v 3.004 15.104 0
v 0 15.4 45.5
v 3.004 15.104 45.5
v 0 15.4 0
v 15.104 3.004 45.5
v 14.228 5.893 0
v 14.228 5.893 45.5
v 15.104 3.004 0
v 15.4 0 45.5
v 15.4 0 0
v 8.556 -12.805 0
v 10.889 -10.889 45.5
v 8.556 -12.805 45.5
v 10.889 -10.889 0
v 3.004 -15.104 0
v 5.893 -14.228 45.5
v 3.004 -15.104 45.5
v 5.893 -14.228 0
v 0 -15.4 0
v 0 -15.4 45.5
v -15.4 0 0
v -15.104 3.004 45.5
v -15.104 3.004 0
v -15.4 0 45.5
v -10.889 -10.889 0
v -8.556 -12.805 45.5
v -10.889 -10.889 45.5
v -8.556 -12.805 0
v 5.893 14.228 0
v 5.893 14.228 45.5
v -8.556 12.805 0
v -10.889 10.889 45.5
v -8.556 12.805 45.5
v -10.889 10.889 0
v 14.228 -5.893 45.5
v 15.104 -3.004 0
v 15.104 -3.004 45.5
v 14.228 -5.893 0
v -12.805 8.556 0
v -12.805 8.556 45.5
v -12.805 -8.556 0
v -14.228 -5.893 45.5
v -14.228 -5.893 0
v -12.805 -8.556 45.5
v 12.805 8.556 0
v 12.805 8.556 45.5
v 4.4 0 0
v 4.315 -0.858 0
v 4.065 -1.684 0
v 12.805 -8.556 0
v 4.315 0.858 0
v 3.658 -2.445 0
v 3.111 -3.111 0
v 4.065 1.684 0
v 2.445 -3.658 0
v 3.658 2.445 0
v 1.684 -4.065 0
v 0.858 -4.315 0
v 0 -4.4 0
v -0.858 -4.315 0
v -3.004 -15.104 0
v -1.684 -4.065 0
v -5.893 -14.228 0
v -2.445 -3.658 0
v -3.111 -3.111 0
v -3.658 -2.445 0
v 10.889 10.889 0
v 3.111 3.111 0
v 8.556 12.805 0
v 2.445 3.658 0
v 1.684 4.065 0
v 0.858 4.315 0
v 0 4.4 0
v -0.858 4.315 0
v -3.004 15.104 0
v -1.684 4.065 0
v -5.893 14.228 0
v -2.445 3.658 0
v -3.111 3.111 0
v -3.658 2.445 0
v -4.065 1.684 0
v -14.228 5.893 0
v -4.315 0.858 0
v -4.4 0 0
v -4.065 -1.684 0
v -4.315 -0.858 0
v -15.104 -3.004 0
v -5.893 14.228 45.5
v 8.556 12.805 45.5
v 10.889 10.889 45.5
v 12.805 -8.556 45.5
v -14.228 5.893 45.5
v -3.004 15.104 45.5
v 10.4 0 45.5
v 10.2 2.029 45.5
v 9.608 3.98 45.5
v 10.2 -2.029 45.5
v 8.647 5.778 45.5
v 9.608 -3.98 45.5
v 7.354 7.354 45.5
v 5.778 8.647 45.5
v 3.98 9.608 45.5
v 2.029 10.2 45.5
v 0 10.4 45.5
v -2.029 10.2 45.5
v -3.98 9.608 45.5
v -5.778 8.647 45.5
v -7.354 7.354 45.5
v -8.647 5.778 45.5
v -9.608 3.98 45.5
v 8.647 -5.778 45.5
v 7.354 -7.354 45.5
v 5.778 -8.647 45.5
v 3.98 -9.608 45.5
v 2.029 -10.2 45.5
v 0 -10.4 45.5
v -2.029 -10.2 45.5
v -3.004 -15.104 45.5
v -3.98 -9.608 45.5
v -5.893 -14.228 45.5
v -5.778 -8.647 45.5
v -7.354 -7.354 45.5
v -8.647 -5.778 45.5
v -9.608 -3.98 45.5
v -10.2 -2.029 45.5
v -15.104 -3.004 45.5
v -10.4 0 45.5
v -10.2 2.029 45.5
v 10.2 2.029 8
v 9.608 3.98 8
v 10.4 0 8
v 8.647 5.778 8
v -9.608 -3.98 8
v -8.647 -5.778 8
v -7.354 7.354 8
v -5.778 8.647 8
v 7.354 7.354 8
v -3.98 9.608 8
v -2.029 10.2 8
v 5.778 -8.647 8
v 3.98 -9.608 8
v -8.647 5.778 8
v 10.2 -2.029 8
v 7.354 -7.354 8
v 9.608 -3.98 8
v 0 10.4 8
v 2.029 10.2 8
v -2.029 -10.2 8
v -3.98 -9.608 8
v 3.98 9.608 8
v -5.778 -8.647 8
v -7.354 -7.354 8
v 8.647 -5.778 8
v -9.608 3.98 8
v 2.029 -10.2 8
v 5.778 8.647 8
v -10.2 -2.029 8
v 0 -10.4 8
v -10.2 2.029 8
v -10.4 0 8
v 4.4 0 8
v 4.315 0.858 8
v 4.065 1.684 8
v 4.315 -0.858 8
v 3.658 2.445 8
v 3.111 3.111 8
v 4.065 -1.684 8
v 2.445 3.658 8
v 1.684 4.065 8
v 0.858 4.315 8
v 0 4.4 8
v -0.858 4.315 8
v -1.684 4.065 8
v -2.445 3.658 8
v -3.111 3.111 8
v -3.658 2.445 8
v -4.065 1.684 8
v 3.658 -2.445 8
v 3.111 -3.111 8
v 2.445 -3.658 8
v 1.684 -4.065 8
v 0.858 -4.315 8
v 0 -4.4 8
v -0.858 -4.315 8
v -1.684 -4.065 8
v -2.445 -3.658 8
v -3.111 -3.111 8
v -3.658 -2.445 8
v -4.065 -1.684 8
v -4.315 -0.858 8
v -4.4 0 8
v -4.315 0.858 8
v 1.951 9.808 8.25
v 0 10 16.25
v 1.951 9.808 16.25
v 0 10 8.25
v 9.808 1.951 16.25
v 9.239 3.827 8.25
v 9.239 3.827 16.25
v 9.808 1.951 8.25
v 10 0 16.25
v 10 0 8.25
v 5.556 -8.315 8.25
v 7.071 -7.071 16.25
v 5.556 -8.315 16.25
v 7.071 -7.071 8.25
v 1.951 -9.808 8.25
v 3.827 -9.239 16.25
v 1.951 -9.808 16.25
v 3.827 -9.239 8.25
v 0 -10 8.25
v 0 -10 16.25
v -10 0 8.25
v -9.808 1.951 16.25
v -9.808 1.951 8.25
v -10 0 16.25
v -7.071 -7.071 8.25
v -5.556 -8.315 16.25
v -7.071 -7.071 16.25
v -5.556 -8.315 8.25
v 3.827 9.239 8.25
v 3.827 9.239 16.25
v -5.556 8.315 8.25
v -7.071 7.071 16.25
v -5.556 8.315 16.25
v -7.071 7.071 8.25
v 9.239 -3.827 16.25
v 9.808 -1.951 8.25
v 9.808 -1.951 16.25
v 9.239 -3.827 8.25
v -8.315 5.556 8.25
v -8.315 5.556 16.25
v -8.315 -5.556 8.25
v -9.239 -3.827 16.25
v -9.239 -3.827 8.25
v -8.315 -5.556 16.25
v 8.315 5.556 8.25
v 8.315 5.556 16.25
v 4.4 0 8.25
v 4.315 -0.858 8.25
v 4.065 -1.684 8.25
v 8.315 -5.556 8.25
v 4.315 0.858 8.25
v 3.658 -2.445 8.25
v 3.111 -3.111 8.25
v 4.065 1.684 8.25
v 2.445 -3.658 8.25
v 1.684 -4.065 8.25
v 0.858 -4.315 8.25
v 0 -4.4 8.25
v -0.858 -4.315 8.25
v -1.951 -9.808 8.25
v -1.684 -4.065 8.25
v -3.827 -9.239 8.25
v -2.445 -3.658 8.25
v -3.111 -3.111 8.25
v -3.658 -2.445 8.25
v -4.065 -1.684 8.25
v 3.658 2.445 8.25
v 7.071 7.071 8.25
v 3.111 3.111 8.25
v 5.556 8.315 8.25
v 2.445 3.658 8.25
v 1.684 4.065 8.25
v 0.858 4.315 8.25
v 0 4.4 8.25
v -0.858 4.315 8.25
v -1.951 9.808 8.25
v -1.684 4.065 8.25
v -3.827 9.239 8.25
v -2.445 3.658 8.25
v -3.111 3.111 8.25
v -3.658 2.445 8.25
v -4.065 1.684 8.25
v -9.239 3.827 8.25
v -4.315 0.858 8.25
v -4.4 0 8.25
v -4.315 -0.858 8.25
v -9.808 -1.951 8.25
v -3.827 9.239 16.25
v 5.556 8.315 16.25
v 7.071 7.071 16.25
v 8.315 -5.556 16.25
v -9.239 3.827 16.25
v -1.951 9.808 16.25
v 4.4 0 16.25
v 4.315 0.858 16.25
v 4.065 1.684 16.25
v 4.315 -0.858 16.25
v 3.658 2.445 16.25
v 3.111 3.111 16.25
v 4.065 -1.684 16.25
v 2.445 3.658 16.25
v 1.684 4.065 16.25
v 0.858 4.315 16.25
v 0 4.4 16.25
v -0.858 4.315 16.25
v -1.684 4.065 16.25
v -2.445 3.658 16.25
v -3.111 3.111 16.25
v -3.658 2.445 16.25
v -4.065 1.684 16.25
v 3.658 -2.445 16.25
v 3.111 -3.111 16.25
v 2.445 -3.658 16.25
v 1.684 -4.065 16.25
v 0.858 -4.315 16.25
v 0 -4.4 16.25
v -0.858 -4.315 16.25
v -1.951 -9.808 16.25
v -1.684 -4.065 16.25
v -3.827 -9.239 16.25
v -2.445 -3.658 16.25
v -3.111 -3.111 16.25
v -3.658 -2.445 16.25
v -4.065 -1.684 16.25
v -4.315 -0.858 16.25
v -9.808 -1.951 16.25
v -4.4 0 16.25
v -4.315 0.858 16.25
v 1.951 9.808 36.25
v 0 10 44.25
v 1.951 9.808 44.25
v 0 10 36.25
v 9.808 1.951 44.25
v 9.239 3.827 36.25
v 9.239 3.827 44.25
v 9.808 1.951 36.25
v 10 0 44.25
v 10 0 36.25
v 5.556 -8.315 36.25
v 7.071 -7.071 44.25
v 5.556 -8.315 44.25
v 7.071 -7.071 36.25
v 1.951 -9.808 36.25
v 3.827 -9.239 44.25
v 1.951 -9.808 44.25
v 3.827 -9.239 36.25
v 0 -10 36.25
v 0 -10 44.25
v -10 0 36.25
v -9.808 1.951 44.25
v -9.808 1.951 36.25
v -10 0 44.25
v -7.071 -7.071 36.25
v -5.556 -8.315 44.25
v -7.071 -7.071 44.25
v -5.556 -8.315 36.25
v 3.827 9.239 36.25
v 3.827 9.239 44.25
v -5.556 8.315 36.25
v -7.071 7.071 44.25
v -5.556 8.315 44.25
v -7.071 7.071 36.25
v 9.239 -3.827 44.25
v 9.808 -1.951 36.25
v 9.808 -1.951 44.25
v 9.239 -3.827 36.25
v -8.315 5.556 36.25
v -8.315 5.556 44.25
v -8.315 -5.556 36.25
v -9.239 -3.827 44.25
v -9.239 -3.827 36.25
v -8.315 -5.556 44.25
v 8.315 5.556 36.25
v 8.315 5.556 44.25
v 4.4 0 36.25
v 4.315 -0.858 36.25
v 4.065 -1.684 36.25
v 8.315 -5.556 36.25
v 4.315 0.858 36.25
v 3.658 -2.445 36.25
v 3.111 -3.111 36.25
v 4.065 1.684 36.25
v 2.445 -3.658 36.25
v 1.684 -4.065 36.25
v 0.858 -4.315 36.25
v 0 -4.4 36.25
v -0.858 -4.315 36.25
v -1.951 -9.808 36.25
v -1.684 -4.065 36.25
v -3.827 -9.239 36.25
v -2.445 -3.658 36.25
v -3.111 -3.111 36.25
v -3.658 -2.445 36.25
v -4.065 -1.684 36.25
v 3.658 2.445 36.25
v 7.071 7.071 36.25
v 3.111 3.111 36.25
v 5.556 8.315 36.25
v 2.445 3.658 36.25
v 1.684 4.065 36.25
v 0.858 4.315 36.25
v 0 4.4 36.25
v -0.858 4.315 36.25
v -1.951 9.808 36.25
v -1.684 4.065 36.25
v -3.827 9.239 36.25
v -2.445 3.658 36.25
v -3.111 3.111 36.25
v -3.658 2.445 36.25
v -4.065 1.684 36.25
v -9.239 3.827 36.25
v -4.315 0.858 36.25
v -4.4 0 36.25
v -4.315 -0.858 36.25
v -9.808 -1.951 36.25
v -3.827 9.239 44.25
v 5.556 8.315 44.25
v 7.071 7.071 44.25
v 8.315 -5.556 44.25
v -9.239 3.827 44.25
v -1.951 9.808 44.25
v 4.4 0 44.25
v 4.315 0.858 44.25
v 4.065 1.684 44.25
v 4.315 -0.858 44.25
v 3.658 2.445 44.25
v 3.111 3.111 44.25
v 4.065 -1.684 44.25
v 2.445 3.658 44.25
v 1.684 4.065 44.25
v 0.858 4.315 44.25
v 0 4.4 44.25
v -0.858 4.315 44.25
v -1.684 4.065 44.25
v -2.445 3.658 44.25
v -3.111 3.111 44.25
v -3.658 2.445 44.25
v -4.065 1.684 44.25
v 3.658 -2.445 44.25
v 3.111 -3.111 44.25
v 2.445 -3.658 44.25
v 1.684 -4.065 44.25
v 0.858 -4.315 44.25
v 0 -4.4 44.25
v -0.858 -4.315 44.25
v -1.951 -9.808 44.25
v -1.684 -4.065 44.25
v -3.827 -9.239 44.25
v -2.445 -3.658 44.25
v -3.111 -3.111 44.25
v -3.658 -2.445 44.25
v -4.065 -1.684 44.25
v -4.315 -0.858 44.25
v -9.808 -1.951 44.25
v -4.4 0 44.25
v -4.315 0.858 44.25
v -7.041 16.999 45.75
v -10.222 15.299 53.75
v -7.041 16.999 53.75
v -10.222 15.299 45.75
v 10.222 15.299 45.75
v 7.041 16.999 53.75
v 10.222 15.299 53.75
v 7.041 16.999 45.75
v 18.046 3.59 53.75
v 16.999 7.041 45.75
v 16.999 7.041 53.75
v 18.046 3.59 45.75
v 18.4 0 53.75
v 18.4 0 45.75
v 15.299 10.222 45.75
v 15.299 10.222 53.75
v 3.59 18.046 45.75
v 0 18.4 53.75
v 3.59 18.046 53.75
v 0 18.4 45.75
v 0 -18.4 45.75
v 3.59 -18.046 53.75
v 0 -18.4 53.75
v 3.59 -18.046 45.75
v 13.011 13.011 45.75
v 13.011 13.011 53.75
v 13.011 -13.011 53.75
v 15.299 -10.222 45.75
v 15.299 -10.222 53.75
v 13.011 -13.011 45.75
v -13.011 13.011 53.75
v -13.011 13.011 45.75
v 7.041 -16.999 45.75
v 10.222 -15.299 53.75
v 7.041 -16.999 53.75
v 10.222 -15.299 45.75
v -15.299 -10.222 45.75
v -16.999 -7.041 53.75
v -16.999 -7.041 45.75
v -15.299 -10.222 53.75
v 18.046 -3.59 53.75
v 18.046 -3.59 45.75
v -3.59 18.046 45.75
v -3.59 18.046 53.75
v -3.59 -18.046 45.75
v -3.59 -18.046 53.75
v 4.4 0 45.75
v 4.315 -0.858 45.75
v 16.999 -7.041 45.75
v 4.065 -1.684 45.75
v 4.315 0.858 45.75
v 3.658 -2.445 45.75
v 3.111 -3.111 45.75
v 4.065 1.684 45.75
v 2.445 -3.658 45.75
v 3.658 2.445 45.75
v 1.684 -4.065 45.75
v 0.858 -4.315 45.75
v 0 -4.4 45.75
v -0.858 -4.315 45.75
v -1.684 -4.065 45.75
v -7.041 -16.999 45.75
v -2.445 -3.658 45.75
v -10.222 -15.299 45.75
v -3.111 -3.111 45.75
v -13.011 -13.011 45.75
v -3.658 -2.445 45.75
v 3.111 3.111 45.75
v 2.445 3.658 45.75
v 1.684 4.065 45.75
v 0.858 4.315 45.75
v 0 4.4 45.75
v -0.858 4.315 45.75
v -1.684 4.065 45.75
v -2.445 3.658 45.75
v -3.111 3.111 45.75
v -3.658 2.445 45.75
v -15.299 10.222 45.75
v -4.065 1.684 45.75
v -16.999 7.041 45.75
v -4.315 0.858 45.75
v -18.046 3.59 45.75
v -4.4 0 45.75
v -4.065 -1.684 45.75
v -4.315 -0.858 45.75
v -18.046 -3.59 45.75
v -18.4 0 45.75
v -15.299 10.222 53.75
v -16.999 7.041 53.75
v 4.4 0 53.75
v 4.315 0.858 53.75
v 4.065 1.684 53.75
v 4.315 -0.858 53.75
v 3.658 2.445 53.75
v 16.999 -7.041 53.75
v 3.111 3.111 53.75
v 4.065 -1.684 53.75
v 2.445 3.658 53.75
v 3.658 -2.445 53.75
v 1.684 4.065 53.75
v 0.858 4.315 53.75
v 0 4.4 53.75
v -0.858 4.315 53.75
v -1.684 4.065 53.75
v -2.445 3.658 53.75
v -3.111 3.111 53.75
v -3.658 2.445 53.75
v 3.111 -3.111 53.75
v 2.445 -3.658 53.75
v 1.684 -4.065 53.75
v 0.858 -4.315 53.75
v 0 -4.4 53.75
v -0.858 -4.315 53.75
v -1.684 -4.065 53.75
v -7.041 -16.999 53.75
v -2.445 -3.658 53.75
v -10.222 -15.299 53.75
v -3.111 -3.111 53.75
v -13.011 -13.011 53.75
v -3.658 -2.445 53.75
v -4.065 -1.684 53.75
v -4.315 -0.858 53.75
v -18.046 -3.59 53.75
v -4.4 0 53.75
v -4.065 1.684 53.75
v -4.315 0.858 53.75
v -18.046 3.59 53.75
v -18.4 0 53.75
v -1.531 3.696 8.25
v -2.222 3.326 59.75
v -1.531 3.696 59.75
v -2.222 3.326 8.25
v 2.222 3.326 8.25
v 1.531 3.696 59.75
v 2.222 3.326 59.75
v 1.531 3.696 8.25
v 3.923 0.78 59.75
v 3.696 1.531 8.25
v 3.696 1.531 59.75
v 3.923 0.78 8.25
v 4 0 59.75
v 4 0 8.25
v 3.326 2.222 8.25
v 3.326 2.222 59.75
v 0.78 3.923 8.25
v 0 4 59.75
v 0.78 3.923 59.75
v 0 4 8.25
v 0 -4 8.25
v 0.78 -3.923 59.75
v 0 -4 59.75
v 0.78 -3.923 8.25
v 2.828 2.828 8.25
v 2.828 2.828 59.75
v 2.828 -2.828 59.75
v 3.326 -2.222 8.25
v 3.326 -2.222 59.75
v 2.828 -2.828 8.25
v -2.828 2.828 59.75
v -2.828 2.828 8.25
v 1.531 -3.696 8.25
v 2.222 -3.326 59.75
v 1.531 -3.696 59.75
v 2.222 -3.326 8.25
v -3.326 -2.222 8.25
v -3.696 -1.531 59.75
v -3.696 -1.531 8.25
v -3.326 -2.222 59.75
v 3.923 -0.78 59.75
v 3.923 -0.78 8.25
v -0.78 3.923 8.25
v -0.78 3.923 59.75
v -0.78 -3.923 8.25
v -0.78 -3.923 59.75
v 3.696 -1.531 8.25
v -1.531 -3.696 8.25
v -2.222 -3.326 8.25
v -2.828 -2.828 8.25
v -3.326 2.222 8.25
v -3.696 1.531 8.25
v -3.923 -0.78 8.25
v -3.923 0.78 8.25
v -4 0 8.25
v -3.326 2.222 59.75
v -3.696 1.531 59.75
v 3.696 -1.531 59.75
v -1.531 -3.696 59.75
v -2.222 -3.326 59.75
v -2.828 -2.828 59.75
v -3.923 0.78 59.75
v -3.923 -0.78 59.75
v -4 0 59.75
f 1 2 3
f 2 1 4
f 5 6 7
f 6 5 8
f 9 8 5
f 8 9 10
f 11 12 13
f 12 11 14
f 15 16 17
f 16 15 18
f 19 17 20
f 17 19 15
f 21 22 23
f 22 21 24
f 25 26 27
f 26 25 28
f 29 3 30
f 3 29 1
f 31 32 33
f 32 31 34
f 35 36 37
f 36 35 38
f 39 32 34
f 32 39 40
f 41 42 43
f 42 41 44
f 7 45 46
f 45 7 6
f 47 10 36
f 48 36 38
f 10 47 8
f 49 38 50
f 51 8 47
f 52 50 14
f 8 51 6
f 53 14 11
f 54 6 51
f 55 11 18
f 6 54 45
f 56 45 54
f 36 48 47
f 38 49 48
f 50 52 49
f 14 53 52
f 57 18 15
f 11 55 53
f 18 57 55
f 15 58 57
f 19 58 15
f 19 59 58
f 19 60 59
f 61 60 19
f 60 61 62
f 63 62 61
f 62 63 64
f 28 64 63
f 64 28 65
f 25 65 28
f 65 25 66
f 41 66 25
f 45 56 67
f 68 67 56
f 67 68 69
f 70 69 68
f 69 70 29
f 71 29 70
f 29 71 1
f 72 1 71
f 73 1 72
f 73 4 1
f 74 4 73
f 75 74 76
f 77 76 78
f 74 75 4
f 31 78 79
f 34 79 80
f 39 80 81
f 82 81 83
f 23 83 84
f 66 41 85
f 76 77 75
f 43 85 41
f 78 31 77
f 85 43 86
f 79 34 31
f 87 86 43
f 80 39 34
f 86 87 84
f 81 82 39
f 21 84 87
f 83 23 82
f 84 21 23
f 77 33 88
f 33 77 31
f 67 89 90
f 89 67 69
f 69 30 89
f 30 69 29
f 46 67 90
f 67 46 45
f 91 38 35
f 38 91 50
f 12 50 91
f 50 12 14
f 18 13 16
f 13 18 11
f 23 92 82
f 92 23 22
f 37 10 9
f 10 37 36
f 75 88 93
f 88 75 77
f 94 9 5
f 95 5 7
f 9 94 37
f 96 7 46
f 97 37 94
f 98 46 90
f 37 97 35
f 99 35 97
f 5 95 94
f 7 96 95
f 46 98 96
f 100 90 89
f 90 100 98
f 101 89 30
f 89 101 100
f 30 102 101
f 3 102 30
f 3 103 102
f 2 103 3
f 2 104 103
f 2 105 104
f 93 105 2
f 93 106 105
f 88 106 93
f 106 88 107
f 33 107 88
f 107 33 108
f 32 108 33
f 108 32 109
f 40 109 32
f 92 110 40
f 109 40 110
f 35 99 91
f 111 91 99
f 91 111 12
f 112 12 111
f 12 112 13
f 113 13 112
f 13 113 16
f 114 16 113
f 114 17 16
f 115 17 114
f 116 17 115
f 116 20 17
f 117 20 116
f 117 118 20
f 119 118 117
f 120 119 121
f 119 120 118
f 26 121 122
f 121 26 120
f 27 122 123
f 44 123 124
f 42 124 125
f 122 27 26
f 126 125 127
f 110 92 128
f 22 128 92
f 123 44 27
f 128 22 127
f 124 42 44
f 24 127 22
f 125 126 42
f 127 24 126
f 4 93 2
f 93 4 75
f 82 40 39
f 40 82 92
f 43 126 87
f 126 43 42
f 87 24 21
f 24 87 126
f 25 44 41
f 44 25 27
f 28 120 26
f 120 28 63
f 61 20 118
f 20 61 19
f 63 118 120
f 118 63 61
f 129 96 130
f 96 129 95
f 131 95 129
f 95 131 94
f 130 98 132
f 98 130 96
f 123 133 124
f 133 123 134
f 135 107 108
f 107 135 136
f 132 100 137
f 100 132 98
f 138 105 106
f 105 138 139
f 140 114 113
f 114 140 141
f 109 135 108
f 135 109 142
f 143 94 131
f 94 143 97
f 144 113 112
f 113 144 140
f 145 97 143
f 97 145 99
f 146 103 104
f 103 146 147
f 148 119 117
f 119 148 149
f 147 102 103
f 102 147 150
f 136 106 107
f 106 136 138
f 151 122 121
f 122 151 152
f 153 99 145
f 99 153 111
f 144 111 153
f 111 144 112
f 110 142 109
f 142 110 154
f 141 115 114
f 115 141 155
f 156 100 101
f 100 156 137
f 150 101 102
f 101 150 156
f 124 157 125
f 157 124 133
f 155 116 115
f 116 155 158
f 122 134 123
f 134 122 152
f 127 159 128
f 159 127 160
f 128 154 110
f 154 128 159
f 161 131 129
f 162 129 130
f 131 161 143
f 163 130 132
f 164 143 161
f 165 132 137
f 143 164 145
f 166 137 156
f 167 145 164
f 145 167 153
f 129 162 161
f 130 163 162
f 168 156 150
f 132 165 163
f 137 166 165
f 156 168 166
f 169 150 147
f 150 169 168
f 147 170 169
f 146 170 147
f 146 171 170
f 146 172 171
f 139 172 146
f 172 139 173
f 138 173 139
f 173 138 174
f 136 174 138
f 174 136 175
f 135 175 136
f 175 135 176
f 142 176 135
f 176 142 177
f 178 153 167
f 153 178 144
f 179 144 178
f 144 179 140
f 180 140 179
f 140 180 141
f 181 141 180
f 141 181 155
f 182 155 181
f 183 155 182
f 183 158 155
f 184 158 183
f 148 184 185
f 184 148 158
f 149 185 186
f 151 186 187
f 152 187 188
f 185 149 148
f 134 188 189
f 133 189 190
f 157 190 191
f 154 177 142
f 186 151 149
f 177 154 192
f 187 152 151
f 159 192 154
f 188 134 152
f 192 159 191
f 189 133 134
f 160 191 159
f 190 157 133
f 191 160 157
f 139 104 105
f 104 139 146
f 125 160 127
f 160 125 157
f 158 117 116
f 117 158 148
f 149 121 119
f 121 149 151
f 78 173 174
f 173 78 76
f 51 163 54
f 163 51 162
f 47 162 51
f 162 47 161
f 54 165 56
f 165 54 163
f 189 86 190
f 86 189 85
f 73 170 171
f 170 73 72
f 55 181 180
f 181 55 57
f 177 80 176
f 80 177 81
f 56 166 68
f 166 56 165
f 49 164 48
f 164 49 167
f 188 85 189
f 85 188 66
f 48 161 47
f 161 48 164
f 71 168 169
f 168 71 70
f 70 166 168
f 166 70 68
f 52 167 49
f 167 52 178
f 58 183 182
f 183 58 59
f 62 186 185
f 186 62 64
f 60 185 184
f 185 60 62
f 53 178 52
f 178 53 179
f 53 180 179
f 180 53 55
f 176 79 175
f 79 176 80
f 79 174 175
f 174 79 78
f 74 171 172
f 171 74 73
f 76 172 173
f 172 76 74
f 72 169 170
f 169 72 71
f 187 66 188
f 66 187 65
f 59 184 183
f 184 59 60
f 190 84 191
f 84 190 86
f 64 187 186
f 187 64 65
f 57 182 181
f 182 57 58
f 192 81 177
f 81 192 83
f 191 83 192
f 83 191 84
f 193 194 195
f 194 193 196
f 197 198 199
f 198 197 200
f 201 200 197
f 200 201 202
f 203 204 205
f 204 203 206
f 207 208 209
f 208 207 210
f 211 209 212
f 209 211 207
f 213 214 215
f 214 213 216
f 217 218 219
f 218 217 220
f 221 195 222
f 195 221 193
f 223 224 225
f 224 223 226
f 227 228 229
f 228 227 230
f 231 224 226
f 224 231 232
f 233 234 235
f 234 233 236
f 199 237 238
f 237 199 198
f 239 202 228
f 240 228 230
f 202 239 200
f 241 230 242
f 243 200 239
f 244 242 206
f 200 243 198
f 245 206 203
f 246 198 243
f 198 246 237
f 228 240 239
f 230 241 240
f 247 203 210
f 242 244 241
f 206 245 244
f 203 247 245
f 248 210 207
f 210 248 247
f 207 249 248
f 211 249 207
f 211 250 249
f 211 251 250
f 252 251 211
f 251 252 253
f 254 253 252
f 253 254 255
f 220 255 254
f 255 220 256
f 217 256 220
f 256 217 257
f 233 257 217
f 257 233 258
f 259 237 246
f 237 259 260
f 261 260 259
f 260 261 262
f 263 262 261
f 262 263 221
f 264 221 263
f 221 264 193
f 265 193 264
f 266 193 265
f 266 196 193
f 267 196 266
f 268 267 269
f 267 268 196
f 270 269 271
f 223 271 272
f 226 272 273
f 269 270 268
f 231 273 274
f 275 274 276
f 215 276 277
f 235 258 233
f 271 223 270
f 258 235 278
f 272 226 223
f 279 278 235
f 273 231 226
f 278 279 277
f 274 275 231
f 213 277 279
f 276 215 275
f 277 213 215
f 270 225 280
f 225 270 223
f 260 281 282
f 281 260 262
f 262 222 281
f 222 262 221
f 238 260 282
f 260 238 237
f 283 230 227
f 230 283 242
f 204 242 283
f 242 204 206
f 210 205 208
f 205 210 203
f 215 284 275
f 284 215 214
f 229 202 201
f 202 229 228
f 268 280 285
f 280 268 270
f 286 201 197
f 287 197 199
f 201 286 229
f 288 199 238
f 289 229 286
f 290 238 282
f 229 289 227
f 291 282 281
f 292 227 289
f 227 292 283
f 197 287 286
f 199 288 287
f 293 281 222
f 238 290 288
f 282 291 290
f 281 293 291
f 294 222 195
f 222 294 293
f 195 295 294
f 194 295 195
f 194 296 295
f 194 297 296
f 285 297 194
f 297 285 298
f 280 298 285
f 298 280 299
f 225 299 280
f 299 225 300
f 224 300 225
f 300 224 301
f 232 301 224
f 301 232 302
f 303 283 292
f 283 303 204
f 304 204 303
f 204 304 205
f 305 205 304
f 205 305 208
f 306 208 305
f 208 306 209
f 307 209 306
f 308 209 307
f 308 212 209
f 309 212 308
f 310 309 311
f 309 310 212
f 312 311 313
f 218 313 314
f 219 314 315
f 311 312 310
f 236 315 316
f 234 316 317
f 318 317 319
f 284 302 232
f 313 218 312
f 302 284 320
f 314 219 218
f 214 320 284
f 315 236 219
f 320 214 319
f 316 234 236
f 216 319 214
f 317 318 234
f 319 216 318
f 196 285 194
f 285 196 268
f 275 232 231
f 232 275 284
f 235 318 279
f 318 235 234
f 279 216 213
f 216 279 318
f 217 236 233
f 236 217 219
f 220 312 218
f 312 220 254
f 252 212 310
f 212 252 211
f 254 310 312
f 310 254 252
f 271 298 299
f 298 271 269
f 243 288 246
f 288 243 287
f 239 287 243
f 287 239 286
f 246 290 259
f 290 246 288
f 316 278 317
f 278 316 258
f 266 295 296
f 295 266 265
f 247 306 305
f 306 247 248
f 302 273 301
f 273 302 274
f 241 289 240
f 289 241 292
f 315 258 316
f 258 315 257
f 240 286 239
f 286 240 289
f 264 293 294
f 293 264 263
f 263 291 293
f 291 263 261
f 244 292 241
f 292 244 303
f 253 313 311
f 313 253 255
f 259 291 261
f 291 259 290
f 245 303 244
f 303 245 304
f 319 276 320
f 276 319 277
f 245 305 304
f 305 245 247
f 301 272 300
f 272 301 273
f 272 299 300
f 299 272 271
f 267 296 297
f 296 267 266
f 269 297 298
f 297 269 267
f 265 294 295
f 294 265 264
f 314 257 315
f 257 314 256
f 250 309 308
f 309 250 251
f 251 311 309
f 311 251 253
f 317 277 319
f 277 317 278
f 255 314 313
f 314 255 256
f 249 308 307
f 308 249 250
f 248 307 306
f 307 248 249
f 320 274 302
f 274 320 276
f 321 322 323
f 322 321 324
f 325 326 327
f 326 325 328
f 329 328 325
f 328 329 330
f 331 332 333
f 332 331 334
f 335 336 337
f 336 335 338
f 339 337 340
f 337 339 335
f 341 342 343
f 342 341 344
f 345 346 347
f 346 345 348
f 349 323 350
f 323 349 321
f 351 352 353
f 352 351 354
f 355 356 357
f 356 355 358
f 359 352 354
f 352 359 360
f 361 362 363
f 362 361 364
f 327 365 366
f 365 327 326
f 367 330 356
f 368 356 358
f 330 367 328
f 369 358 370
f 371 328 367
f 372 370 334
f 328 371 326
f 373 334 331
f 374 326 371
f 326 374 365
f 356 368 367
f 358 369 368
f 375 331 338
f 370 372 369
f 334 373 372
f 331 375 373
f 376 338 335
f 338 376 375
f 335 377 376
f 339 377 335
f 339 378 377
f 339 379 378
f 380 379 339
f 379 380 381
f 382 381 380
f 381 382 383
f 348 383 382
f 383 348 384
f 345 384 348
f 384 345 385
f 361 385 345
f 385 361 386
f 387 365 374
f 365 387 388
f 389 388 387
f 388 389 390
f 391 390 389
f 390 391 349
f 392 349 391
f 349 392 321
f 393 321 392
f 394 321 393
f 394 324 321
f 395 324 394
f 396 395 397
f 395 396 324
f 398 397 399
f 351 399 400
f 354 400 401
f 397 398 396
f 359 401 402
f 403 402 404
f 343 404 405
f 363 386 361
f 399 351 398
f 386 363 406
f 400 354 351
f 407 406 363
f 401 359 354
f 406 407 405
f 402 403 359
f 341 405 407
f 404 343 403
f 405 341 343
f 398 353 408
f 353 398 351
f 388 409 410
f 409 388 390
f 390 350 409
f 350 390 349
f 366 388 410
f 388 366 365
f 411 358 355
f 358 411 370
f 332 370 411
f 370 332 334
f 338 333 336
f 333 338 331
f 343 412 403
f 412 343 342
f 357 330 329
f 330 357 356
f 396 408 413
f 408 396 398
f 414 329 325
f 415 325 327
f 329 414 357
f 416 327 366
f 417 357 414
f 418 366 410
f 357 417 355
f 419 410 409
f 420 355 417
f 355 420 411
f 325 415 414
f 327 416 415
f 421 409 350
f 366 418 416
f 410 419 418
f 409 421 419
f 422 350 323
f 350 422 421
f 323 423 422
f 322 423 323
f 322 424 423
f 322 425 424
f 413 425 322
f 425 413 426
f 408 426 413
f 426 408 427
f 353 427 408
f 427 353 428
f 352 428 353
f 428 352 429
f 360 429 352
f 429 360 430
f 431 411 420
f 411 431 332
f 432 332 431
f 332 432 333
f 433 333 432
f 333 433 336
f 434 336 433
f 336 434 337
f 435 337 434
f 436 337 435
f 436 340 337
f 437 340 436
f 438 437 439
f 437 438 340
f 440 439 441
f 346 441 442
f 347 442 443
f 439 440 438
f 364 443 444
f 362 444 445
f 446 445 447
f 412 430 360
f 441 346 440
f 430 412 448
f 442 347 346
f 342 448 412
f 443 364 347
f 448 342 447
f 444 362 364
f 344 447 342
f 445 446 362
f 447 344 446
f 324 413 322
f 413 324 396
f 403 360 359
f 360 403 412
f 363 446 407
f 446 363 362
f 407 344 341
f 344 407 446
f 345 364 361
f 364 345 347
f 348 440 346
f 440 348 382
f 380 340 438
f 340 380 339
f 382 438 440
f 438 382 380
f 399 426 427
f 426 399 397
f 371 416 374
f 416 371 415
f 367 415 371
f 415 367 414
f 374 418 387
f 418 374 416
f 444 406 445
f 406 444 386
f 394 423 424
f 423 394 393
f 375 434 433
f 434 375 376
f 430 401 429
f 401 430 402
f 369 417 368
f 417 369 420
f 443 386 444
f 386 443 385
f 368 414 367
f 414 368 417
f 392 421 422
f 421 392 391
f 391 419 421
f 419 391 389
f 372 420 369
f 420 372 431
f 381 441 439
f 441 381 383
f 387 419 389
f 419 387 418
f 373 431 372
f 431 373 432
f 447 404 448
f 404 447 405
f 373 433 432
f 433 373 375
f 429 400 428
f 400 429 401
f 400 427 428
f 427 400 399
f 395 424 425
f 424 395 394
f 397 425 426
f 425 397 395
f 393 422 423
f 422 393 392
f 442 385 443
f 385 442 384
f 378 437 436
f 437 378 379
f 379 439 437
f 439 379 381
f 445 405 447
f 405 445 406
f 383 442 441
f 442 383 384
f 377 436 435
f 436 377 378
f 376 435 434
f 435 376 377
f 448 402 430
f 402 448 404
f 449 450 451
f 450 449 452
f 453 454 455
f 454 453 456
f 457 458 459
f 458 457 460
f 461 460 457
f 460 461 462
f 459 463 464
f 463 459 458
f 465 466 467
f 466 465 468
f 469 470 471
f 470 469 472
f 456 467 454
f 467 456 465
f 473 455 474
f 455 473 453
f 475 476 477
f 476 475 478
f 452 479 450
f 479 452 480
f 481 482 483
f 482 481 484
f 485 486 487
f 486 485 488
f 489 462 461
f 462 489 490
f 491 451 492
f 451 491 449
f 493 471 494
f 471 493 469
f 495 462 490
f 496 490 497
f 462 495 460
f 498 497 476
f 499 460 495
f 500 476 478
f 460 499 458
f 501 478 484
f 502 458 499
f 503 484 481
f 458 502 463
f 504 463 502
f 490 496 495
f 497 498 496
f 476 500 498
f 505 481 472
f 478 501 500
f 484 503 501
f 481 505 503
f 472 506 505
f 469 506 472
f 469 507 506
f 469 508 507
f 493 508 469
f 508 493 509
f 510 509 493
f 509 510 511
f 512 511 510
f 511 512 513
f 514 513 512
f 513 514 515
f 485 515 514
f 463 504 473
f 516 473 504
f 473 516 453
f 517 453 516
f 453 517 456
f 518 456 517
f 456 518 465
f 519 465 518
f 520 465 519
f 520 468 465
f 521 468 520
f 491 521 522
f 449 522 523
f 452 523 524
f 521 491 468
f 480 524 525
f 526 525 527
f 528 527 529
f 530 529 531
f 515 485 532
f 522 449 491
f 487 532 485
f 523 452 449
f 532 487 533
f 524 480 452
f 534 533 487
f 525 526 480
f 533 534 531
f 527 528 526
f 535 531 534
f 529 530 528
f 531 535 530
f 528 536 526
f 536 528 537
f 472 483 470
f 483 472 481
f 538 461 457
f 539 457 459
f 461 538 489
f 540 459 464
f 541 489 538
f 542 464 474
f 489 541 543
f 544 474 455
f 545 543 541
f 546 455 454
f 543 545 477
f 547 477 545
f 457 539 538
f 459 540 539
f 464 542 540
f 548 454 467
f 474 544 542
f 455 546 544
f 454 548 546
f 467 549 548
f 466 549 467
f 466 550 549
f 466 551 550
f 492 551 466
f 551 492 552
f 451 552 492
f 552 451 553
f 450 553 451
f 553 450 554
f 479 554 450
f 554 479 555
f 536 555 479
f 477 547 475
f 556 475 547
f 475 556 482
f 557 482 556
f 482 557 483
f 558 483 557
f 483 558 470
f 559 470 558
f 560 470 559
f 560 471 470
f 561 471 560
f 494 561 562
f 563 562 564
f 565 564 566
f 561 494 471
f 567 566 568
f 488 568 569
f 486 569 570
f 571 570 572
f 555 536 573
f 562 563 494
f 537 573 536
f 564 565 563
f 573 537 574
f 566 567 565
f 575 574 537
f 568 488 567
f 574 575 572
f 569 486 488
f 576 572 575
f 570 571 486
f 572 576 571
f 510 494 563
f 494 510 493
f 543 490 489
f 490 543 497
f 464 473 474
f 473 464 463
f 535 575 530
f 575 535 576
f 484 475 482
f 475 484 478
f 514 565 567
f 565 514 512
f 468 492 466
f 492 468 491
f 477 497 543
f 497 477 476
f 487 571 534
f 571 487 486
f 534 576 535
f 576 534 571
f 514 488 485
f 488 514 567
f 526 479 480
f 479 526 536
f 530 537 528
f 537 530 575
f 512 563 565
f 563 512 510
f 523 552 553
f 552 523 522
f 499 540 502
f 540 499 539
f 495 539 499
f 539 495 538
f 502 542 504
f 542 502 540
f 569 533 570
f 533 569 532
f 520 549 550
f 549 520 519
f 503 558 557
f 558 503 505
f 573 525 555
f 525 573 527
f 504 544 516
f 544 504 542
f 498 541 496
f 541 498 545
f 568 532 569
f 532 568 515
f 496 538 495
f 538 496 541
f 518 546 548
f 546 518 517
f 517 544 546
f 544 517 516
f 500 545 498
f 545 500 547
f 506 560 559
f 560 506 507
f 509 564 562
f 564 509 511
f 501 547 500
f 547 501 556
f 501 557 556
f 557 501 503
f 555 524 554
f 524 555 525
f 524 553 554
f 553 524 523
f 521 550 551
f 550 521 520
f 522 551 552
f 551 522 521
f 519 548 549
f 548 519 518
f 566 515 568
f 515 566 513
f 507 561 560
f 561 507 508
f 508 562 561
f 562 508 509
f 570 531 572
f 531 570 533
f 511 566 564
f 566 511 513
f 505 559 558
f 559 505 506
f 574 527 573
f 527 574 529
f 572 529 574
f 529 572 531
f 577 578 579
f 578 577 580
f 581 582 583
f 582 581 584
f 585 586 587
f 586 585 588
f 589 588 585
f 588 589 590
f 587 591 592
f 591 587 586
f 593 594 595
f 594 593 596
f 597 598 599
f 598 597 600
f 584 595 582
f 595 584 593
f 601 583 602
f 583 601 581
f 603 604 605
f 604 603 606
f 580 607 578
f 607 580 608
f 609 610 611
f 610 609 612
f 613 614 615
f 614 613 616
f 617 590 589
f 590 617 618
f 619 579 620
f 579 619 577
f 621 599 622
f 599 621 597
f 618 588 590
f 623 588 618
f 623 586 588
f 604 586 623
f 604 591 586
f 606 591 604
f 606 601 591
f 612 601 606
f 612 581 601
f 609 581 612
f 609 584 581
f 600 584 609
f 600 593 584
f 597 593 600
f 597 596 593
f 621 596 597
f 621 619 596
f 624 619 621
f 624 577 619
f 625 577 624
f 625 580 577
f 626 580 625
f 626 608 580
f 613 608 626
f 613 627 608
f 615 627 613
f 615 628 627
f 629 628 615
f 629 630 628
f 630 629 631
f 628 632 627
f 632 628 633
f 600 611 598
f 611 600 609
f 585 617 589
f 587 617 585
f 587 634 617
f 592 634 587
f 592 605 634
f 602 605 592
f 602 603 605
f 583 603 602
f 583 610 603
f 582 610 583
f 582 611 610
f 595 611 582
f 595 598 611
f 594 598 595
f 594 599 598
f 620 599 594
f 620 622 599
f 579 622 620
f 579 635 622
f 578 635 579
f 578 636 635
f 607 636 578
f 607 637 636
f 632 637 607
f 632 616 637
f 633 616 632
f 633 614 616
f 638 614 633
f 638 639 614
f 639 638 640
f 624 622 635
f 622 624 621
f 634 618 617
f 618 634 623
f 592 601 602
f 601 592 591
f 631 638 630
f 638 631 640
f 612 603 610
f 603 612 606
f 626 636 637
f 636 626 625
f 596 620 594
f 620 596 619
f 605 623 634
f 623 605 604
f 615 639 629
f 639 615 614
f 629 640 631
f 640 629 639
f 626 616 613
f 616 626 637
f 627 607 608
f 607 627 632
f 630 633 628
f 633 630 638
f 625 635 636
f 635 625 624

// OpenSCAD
$fn = 32;

// ------------------------------------------------------------------------
// Shaft station: cup d30.8 x 45.5 mm, shaft d8
// Every part is its own module, assembly() places every instance.
// ------------------------------------------------------------------------

// --- part 1 ---
module housing_cup() {
  difference() {
    cylinder(h = 45.5, d = 30.8);
    translate([0, 0, 8]) cylinder(h = 38.5, d = 20.8);
    translate([0, 0, -1]) cylinder(h = 10, d = 8.8);
  }
}

// --- part 2 ---
module bearing_lower() {
  difference() {
      translate([0, 0, 0]) cylinder(h = 8, d = 20);
      translate([0, 0, -1]) cylinder(h = 10, d = 8.8);
    }
}

// --- part 3 ---
module bearing_upper() {
  difference() {
      translate([0, 0, 0]) cylinder(h = 8, d = 20);
      translate([0, 0, -1]) cylinder(h = 10, d = 8.8);
    }
}

// --- part 4 ---
module station_shaft() {
  translate([0, 0, -25.75]) cylinder(h = 51.5, d = 8);
}

// --- part 5 ---
module station_cover() {
  difference() {
    cylinder(h = 8, d = 36.8);
    translate([0, 0, -1]) cylinder(h = 10, d = 8.8);
  }
}

// --- assembly ---
module assembly() {
  color([0.80, 0.24, 0.20]) translate([0, 0, 0]) rotate([0, 0, 0]) housing_cup();
  color([0.20, 0.45, 0.75]) translate([0, 0, 8.25]) rotate([0, 0, 0]) bearing_lower();
  color([0.25, 0.62, 0.32]) translate([0, 0, 36.25]) rotate([0, 0, 0]) bearing_upper();
  color([0.92, 0.70, 0.18]) translate([0, 0, 34]) rotate([0, 0, 0]) station_shaft();
  color([0.58, 0.35, 0.70]) translate([0, 0, 45.75]) rotate([0, 0, 0]) station_cover();
}

assembly();
